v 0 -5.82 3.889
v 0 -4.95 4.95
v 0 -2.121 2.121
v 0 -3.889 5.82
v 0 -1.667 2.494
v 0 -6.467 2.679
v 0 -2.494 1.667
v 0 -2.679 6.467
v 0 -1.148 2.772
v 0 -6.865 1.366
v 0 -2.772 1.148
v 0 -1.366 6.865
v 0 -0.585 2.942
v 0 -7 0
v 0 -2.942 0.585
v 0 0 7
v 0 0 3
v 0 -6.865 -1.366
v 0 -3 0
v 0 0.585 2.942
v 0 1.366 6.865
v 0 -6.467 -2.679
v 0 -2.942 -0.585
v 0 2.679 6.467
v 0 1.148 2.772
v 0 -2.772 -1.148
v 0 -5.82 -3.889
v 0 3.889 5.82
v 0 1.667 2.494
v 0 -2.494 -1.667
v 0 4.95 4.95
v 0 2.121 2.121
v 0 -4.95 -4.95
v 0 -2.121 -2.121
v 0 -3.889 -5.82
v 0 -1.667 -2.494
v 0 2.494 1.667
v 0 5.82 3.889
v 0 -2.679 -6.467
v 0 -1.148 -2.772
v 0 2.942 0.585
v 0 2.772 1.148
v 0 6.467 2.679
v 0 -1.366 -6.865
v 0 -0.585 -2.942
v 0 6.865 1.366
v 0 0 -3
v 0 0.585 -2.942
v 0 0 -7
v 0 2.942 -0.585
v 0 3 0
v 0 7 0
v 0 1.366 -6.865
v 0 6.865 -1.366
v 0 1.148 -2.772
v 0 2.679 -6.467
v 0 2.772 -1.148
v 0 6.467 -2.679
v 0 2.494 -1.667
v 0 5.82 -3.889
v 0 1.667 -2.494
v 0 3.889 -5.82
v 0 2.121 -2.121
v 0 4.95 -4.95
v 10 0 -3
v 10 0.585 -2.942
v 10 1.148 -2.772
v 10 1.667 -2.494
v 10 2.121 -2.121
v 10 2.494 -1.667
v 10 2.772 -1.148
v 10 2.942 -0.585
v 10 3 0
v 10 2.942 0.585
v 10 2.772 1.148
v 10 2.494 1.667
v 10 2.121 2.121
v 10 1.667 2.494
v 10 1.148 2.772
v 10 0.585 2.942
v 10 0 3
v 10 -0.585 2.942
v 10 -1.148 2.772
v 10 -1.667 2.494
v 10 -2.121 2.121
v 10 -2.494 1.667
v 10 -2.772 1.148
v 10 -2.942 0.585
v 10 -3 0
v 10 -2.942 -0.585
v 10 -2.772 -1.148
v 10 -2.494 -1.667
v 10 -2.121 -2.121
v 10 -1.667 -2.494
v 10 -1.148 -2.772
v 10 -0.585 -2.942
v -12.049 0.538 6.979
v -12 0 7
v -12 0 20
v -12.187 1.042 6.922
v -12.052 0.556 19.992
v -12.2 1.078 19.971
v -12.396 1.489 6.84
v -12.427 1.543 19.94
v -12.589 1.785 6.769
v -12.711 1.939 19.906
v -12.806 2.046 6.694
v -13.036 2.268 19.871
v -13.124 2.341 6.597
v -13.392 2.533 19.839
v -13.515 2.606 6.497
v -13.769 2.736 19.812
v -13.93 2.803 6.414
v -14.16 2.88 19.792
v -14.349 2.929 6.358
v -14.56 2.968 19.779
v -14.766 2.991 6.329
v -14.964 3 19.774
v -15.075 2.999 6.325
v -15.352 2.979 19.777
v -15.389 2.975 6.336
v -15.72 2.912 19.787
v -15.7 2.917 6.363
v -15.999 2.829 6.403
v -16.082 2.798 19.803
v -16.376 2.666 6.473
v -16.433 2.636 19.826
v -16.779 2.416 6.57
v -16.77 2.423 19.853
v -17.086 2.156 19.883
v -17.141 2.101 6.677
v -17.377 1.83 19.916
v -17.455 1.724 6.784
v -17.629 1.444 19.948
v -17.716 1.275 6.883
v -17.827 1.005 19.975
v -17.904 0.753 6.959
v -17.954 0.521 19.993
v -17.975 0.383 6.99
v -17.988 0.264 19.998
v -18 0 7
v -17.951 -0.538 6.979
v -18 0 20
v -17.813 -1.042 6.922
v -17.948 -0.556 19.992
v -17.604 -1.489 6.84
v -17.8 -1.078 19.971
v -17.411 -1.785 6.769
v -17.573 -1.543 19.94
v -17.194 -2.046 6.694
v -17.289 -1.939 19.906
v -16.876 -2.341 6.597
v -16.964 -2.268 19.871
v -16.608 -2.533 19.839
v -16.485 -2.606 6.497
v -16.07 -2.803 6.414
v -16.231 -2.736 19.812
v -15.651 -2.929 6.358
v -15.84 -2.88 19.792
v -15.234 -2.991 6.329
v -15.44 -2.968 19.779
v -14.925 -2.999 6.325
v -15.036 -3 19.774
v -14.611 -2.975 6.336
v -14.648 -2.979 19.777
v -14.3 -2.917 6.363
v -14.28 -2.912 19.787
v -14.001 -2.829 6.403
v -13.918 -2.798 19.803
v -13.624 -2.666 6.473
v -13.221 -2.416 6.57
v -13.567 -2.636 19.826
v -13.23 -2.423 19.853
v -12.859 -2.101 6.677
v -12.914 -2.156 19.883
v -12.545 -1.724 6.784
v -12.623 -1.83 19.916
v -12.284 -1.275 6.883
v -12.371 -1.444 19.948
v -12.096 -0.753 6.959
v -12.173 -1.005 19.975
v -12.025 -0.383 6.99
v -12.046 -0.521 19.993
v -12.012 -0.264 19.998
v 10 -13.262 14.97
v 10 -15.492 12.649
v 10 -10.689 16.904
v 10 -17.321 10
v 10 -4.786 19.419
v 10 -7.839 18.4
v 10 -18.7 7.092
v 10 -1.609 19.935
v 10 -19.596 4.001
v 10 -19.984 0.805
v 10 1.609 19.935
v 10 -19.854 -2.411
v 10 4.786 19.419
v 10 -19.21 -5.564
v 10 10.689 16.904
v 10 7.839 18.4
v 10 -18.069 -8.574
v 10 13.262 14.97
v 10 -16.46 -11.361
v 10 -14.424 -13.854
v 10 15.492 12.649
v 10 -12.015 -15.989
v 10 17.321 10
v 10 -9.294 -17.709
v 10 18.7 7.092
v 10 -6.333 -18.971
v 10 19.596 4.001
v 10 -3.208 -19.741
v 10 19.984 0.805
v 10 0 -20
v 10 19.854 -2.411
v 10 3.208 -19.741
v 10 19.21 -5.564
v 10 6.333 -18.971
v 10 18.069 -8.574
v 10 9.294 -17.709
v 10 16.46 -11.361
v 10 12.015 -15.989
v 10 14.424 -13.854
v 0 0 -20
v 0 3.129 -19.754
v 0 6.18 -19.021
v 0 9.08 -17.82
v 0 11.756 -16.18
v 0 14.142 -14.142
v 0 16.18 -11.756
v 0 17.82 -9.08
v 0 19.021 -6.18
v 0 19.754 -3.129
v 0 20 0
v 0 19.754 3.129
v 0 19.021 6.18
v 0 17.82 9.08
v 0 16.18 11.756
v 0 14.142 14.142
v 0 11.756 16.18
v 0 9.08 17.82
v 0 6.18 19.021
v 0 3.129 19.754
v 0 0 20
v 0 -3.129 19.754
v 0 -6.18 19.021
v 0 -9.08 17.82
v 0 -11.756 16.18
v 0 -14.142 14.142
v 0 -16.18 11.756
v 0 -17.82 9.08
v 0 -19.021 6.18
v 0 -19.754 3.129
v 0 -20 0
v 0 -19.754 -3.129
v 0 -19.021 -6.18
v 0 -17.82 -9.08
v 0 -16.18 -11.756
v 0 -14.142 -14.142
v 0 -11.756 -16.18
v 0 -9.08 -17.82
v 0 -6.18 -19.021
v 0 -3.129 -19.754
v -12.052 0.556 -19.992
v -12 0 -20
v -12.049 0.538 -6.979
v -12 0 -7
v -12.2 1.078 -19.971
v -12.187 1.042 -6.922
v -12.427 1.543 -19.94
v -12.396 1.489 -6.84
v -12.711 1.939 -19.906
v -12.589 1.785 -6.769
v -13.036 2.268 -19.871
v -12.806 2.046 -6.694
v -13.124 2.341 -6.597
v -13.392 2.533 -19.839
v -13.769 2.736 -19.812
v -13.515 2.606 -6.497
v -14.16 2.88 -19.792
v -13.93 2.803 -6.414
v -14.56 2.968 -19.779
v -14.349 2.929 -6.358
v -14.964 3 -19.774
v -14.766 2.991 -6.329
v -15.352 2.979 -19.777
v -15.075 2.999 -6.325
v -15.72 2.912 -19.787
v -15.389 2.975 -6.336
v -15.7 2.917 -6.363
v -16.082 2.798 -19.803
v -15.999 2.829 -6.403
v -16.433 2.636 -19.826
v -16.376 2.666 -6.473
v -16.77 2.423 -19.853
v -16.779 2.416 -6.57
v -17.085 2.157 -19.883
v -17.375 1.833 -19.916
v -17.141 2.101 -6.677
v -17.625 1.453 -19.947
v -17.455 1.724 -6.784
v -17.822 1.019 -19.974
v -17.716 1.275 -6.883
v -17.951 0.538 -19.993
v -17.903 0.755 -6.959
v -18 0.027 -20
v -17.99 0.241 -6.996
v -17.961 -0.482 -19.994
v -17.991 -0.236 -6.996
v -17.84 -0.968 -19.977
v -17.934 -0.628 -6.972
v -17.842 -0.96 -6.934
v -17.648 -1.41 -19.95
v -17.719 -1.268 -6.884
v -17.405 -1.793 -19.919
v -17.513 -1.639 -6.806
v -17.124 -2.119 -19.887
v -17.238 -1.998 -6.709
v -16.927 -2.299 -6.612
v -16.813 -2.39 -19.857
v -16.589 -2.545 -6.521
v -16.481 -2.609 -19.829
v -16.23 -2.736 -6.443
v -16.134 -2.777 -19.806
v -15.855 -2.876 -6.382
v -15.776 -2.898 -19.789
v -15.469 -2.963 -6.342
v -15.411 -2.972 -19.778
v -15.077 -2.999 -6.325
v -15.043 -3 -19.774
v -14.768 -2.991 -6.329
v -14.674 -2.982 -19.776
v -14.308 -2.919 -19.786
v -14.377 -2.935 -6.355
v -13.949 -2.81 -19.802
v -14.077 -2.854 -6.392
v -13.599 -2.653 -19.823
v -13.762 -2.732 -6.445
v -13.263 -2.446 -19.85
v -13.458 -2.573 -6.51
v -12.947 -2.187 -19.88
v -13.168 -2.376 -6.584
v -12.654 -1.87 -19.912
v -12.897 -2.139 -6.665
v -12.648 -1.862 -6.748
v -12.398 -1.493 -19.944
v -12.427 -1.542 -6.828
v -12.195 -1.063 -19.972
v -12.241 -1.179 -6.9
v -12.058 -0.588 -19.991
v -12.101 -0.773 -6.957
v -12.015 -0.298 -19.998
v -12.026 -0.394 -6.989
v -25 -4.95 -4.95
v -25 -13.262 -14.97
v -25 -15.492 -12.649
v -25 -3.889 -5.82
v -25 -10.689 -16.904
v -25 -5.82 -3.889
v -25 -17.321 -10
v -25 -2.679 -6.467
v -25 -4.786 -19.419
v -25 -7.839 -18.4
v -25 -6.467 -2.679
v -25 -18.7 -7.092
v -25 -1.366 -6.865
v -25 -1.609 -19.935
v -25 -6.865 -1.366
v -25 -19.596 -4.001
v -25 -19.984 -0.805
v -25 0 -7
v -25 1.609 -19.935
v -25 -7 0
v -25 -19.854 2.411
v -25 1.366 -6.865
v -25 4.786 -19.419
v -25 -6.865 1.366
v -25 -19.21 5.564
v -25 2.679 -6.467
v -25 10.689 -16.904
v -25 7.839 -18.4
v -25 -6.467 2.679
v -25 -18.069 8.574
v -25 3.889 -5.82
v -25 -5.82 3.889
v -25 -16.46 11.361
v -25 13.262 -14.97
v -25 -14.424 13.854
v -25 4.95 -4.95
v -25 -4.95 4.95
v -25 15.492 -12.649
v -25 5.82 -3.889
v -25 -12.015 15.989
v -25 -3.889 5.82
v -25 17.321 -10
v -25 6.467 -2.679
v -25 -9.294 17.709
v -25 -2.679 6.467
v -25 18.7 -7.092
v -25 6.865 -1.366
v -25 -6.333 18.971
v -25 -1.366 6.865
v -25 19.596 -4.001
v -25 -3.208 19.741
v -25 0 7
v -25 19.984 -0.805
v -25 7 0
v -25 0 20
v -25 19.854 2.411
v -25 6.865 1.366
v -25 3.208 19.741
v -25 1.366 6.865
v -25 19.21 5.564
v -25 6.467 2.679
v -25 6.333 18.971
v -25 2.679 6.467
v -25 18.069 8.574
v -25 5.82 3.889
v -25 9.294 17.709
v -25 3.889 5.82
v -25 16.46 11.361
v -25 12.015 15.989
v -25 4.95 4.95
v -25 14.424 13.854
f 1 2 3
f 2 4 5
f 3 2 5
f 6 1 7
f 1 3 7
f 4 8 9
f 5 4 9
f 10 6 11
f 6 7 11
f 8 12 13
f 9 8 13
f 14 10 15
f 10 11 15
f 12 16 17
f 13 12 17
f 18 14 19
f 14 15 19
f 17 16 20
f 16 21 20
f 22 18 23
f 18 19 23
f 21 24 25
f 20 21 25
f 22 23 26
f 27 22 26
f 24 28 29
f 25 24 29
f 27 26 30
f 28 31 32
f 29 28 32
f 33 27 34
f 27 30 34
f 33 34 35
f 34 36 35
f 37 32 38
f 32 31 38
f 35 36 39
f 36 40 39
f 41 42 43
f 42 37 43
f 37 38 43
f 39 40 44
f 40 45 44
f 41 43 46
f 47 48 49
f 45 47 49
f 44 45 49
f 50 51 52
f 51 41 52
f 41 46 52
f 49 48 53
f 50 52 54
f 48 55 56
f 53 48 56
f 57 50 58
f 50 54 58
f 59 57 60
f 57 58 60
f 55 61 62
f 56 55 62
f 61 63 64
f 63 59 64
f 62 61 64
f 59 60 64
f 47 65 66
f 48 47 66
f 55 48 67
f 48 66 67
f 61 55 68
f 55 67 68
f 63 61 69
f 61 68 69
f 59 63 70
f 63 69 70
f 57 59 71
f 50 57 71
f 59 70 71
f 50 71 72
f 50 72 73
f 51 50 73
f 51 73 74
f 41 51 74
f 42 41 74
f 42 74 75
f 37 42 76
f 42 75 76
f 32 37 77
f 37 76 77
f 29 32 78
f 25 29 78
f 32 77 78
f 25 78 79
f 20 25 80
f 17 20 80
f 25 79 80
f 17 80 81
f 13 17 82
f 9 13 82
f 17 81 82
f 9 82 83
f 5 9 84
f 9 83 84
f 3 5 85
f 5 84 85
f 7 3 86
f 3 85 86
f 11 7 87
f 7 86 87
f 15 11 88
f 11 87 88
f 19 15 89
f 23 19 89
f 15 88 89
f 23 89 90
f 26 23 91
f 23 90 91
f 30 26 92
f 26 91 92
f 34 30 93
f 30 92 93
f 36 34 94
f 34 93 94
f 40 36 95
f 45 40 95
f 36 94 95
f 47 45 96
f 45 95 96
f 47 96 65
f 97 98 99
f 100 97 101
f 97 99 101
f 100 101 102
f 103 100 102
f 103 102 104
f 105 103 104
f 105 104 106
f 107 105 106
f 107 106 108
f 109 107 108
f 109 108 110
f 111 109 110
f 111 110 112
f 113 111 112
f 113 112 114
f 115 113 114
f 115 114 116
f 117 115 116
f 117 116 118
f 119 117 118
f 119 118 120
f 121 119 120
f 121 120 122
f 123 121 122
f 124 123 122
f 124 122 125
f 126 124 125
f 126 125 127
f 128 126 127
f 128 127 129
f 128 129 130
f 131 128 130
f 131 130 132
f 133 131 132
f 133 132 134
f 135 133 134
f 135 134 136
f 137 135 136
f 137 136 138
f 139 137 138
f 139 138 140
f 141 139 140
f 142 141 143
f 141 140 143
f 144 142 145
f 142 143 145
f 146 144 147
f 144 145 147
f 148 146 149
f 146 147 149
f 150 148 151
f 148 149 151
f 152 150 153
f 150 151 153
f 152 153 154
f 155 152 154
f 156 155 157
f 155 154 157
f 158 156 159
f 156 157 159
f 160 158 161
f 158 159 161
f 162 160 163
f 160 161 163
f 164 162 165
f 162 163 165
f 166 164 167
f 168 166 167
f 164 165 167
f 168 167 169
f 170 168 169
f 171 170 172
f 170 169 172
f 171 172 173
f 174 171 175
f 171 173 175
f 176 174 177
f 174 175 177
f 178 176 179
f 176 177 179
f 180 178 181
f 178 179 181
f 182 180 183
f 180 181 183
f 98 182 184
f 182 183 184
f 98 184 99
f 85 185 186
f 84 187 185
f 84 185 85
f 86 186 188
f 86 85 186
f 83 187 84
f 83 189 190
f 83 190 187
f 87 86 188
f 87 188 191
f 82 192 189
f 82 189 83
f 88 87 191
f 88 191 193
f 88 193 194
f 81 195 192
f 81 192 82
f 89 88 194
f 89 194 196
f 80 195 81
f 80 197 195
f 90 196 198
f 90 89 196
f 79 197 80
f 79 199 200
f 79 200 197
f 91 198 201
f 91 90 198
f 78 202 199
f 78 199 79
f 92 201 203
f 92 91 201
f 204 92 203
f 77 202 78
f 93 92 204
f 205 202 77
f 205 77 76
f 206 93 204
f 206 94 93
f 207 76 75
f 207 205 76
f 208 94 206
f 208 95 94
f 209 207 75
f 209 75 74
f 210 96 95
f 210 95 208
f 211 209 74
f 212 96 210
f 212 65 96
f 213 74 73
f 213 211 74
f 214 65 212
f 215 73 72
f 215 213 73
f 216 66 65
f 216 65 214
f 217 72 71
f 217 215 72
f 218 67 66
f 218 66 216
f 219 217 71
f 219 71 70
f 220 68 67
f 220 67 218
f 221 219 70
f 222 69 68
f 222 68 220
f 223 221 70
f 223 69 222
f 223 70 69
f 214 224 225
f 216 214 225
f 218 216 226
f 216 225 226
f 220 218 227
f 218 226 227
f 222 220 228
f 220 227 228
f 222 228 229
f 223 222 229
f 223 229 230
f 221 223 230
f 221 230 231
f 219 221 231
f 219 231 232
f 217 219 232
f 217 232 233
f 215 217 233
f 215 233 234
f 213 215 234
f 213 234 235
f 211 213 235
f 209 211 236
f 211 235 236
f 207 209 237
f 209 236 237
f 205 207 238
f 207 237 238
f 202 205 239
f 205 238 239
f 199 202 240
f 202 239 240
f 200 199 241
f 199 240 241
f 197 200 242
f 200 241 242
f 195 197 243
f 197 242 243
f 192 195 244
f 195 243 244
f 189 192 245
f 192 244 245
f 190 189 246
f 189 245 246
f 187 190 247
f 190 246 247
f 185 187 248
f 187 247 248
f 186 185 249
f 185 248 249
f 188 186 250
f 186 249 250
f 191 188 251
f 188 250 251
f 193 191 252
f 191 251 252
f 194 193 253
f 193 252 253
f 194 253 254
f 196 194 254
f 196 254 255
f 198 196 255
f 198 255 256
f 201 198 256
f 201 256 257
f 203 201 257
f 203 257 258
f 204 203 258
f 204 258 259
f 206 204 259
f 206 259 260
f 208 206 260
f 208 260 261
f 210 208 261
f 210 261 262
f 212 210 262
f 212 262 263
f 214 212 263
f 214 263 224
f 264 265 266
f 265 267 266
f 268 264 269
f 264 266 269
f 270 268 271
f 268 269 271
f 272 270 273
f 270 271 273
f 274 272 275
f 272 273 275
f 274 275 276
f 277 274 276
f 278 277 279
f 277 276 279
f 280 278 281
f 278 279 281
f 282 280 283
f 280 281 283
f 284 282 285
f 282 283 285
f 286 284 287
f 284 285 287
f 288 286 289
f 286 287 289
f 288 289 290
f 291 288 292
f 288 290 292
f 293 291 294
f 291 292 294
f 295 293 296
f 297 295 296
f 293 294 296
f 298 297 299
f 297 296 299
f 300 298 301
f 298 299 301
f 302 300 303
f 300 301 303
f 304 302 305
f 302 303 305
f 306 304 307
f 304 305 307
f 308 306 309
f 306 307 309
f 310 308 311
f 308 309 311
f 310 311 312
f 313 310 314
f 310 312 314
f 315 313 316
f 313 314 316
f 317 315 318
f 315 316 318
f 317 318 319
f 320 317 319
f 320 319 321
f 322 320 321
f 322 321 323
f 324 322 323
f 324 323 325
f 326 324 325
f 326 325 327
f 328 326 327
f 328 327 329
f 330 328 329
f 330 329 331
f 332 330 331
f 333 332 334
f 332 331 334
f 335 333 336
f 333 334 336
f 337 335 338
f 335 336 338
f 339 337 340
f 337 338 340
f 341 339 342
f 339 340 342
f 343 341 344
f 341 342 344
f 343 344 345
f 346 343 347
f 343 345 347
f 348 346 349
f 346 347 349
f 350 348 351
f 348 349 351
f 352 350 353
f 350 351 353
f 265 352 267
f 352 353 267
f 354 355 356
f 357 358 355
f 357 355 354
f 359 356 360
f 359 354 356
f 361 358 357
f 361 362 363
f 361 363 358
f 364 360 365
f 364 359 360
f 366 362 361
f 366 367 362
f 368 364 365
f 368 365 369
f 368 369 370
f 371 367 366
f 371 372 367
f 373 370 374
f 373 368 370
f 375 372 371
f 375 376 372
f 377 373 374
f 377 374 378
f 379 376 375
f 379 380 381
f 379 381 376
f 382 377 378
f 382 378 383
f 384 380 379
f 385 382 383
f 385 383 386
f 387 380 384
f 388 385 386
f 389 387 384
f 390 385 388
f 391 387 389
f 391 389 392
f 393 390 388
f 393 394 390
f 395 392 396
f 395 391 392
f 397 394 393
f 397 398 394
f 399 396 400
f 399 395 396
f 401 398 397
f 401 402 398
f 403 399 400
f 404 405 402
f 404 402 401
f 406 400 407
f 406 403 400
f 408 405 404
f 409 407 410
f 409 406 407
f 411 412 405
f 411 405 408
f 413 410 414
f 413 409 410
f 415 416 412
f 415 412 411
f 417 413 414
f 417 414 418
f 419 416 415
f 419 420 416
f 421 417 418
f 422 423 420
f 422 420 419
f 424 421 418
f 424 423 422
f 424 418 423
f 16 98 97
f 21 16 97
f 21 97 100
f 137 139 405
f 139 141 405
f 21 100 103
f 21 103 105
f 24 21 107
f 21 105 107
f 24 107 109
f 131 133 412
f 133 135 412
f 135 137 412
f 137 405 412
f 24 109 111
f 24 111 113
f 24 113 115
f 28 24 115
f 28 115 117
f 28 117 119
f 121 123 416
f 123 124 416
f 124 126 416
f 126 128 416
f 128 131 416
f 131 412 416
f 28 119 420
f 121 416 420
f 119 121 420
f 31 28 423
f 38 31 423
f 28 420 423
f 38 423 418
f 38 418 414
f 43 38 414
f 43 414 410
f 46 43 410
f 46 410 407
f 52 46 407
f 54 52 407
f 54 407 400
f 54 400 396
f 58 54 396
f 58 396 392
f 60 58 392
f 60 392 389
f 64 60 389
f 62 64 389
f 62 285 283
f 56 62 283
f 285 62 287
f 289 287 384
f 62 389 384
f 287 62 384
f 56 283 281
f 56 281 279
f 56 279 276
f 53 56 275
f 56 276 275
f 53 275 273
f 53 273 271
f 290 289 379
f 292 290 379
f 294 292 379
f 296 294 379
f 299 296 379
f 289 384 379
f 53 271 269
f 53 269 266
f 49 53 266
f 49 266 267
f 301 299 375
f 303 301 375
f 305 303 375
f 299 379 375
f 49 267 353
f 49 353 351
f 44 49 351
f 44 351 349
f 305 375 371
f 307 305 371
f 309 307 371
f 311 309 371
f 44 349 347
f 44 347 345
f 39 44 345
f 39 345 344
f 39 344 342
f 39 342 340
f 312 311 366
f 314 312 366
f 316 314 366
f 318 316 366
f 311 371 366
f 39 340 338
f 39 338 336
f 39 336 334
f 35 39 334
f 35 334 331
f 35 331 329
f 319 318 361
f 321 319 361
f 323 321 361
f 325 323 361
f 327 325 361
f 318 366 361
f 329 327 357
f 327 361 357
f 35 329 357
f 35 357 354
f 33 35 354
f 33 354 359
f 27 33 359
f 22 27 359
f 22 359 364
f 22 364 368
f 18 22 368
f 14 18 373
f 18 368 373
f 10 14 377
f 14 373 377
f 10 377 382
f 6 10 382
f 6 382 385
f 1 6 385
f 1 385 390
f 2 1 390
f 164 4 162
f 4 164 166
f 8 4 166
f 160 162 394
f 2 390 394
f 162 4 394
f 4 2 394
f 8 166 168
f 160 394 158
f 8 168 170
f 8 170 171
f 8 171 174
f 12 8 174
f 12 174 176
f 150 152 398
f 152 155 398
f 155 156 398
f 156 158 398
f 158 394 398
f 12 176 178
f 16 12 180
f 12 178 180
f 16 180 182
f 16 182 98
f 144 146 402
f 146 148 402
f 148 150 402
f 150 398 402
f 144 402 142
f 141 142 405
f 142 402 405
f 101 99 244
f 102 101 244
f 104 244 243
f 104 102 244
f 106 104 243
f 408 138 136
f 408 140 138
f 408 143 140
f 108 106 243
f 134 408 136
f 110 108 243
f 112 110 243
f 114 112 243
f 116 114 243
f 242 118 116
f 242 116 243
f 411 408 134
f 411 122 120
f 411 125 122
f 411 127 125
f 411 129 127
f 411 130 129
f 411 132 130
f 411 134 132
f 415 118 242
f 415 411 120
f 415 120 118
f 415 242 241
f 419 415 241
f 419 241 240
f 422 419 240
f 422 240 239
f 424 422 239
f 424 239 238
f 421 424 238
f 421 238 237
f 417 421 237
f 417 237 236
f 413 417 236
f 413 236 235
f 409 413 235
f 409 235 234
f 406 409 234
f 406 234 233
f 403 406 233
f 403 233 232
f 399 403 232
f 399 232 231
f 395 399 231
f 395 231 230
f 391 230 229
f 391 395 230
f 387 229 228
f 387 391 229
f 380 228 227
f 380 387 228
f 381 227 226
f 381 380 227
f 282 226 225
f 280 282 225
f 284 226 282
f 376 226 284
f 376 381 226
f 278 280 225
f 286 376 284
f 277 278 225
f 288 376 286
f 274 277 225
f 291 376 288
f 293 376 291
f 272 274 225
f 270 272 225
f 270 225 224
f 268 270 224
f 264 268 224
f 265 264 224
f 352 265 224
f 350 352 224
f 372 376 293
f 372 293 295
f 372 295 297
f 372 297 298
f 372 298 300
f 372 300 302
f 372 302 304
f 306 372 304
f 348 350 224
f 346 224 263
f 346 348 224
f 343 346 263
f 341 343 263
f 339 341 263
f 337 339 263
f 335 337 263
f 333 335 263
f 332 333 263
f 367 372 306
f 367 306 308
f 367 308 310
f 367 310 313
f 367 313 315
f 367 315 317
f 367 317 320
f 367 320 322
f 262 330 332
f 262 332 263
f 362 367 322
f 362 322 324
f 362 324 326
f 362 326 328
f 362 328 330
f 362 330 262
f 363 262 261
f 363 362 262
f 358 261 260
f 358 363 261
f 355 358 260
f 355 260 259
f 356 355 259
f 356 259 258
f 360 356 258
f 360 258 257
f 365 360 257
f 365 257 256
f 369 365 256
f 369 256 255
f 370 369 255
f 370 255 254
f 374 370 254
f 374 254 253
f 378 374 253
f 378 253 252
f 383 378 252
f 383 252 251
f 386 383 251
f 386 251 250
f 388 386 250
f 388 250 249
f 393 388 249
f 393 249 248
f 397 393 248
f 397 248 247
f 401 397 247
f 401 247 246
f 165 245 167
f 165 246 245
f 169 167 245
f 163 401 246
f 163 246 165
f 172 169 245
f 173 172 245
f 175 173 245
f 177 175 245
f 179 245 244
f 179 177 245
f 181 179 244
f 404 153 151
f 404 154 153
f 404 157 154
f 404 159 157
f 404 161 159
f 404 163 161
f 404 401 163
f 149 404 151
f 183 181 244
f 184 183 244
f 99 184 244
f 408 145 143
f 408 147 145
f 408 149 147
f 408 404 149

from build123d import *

# Parameters (mm, degrees)
SKETCH_1_R          = 20
EXTRUDE_2_DEPTH     = 10
EXTRUDE_START       = 25
SKETCH_2_R          = 20
SKETCH_2_R_2        = 7
EXTRUDE_3_DEPTH     = 25
SKETCH_3_R          = 3
CUT_EXTRUDE_2_DEPTH = 10
SKETCH_4_R          = 3
CUT_EXTRUDE_3_DEPTH = 20


with BuildPart() as part:
    # 草图1 → 凸台-拉伸2 (new body)
    with BuildSketch(Plane(origin=(0, 0, 0), x_dir=(0, 0, -1), z_dir=(1, 0, 0))):
        Circle(SKETCH_1_R)
    extrude(amount=EXTRUDE_2_DEPTH)

    # 草图2 → 凸台-拉伸3 (add)
    with BuildSketch(Plane.ZY.offset(EXTRUDE_START)):
        Circle(SKETCH_2_R)
        Circle(SKETCH_2_R_2, mode=Mode.SUBTRACT)
    extrude(amount=-EXTRUDE_3_DEPTH)

    # 草图3 → 切除-拉伸2 (cut)
    with BuildSketch(Plane(origin=(10, 0, 0), x_dir=(0, 0, -1), z_dir=(1, 0, 0))):
        Circle(SKETCH_3_R)
    extrude(amount=-CUT_EXTRUDE_2_DEPTH, mode=Mode.SUBTRACT)

    # 草图4 → 切除-拉伸3 (cut, symmetric)
    with BuildSketch(Plane.XY):
        with Locations((-15, 0)):
            Circle(SKETCH_4_R)
    extrude(amount=CUT_EXTRUDE_3_DEPTH, both=True, mode=Mode.SUBTRACT)


solid = part.part
